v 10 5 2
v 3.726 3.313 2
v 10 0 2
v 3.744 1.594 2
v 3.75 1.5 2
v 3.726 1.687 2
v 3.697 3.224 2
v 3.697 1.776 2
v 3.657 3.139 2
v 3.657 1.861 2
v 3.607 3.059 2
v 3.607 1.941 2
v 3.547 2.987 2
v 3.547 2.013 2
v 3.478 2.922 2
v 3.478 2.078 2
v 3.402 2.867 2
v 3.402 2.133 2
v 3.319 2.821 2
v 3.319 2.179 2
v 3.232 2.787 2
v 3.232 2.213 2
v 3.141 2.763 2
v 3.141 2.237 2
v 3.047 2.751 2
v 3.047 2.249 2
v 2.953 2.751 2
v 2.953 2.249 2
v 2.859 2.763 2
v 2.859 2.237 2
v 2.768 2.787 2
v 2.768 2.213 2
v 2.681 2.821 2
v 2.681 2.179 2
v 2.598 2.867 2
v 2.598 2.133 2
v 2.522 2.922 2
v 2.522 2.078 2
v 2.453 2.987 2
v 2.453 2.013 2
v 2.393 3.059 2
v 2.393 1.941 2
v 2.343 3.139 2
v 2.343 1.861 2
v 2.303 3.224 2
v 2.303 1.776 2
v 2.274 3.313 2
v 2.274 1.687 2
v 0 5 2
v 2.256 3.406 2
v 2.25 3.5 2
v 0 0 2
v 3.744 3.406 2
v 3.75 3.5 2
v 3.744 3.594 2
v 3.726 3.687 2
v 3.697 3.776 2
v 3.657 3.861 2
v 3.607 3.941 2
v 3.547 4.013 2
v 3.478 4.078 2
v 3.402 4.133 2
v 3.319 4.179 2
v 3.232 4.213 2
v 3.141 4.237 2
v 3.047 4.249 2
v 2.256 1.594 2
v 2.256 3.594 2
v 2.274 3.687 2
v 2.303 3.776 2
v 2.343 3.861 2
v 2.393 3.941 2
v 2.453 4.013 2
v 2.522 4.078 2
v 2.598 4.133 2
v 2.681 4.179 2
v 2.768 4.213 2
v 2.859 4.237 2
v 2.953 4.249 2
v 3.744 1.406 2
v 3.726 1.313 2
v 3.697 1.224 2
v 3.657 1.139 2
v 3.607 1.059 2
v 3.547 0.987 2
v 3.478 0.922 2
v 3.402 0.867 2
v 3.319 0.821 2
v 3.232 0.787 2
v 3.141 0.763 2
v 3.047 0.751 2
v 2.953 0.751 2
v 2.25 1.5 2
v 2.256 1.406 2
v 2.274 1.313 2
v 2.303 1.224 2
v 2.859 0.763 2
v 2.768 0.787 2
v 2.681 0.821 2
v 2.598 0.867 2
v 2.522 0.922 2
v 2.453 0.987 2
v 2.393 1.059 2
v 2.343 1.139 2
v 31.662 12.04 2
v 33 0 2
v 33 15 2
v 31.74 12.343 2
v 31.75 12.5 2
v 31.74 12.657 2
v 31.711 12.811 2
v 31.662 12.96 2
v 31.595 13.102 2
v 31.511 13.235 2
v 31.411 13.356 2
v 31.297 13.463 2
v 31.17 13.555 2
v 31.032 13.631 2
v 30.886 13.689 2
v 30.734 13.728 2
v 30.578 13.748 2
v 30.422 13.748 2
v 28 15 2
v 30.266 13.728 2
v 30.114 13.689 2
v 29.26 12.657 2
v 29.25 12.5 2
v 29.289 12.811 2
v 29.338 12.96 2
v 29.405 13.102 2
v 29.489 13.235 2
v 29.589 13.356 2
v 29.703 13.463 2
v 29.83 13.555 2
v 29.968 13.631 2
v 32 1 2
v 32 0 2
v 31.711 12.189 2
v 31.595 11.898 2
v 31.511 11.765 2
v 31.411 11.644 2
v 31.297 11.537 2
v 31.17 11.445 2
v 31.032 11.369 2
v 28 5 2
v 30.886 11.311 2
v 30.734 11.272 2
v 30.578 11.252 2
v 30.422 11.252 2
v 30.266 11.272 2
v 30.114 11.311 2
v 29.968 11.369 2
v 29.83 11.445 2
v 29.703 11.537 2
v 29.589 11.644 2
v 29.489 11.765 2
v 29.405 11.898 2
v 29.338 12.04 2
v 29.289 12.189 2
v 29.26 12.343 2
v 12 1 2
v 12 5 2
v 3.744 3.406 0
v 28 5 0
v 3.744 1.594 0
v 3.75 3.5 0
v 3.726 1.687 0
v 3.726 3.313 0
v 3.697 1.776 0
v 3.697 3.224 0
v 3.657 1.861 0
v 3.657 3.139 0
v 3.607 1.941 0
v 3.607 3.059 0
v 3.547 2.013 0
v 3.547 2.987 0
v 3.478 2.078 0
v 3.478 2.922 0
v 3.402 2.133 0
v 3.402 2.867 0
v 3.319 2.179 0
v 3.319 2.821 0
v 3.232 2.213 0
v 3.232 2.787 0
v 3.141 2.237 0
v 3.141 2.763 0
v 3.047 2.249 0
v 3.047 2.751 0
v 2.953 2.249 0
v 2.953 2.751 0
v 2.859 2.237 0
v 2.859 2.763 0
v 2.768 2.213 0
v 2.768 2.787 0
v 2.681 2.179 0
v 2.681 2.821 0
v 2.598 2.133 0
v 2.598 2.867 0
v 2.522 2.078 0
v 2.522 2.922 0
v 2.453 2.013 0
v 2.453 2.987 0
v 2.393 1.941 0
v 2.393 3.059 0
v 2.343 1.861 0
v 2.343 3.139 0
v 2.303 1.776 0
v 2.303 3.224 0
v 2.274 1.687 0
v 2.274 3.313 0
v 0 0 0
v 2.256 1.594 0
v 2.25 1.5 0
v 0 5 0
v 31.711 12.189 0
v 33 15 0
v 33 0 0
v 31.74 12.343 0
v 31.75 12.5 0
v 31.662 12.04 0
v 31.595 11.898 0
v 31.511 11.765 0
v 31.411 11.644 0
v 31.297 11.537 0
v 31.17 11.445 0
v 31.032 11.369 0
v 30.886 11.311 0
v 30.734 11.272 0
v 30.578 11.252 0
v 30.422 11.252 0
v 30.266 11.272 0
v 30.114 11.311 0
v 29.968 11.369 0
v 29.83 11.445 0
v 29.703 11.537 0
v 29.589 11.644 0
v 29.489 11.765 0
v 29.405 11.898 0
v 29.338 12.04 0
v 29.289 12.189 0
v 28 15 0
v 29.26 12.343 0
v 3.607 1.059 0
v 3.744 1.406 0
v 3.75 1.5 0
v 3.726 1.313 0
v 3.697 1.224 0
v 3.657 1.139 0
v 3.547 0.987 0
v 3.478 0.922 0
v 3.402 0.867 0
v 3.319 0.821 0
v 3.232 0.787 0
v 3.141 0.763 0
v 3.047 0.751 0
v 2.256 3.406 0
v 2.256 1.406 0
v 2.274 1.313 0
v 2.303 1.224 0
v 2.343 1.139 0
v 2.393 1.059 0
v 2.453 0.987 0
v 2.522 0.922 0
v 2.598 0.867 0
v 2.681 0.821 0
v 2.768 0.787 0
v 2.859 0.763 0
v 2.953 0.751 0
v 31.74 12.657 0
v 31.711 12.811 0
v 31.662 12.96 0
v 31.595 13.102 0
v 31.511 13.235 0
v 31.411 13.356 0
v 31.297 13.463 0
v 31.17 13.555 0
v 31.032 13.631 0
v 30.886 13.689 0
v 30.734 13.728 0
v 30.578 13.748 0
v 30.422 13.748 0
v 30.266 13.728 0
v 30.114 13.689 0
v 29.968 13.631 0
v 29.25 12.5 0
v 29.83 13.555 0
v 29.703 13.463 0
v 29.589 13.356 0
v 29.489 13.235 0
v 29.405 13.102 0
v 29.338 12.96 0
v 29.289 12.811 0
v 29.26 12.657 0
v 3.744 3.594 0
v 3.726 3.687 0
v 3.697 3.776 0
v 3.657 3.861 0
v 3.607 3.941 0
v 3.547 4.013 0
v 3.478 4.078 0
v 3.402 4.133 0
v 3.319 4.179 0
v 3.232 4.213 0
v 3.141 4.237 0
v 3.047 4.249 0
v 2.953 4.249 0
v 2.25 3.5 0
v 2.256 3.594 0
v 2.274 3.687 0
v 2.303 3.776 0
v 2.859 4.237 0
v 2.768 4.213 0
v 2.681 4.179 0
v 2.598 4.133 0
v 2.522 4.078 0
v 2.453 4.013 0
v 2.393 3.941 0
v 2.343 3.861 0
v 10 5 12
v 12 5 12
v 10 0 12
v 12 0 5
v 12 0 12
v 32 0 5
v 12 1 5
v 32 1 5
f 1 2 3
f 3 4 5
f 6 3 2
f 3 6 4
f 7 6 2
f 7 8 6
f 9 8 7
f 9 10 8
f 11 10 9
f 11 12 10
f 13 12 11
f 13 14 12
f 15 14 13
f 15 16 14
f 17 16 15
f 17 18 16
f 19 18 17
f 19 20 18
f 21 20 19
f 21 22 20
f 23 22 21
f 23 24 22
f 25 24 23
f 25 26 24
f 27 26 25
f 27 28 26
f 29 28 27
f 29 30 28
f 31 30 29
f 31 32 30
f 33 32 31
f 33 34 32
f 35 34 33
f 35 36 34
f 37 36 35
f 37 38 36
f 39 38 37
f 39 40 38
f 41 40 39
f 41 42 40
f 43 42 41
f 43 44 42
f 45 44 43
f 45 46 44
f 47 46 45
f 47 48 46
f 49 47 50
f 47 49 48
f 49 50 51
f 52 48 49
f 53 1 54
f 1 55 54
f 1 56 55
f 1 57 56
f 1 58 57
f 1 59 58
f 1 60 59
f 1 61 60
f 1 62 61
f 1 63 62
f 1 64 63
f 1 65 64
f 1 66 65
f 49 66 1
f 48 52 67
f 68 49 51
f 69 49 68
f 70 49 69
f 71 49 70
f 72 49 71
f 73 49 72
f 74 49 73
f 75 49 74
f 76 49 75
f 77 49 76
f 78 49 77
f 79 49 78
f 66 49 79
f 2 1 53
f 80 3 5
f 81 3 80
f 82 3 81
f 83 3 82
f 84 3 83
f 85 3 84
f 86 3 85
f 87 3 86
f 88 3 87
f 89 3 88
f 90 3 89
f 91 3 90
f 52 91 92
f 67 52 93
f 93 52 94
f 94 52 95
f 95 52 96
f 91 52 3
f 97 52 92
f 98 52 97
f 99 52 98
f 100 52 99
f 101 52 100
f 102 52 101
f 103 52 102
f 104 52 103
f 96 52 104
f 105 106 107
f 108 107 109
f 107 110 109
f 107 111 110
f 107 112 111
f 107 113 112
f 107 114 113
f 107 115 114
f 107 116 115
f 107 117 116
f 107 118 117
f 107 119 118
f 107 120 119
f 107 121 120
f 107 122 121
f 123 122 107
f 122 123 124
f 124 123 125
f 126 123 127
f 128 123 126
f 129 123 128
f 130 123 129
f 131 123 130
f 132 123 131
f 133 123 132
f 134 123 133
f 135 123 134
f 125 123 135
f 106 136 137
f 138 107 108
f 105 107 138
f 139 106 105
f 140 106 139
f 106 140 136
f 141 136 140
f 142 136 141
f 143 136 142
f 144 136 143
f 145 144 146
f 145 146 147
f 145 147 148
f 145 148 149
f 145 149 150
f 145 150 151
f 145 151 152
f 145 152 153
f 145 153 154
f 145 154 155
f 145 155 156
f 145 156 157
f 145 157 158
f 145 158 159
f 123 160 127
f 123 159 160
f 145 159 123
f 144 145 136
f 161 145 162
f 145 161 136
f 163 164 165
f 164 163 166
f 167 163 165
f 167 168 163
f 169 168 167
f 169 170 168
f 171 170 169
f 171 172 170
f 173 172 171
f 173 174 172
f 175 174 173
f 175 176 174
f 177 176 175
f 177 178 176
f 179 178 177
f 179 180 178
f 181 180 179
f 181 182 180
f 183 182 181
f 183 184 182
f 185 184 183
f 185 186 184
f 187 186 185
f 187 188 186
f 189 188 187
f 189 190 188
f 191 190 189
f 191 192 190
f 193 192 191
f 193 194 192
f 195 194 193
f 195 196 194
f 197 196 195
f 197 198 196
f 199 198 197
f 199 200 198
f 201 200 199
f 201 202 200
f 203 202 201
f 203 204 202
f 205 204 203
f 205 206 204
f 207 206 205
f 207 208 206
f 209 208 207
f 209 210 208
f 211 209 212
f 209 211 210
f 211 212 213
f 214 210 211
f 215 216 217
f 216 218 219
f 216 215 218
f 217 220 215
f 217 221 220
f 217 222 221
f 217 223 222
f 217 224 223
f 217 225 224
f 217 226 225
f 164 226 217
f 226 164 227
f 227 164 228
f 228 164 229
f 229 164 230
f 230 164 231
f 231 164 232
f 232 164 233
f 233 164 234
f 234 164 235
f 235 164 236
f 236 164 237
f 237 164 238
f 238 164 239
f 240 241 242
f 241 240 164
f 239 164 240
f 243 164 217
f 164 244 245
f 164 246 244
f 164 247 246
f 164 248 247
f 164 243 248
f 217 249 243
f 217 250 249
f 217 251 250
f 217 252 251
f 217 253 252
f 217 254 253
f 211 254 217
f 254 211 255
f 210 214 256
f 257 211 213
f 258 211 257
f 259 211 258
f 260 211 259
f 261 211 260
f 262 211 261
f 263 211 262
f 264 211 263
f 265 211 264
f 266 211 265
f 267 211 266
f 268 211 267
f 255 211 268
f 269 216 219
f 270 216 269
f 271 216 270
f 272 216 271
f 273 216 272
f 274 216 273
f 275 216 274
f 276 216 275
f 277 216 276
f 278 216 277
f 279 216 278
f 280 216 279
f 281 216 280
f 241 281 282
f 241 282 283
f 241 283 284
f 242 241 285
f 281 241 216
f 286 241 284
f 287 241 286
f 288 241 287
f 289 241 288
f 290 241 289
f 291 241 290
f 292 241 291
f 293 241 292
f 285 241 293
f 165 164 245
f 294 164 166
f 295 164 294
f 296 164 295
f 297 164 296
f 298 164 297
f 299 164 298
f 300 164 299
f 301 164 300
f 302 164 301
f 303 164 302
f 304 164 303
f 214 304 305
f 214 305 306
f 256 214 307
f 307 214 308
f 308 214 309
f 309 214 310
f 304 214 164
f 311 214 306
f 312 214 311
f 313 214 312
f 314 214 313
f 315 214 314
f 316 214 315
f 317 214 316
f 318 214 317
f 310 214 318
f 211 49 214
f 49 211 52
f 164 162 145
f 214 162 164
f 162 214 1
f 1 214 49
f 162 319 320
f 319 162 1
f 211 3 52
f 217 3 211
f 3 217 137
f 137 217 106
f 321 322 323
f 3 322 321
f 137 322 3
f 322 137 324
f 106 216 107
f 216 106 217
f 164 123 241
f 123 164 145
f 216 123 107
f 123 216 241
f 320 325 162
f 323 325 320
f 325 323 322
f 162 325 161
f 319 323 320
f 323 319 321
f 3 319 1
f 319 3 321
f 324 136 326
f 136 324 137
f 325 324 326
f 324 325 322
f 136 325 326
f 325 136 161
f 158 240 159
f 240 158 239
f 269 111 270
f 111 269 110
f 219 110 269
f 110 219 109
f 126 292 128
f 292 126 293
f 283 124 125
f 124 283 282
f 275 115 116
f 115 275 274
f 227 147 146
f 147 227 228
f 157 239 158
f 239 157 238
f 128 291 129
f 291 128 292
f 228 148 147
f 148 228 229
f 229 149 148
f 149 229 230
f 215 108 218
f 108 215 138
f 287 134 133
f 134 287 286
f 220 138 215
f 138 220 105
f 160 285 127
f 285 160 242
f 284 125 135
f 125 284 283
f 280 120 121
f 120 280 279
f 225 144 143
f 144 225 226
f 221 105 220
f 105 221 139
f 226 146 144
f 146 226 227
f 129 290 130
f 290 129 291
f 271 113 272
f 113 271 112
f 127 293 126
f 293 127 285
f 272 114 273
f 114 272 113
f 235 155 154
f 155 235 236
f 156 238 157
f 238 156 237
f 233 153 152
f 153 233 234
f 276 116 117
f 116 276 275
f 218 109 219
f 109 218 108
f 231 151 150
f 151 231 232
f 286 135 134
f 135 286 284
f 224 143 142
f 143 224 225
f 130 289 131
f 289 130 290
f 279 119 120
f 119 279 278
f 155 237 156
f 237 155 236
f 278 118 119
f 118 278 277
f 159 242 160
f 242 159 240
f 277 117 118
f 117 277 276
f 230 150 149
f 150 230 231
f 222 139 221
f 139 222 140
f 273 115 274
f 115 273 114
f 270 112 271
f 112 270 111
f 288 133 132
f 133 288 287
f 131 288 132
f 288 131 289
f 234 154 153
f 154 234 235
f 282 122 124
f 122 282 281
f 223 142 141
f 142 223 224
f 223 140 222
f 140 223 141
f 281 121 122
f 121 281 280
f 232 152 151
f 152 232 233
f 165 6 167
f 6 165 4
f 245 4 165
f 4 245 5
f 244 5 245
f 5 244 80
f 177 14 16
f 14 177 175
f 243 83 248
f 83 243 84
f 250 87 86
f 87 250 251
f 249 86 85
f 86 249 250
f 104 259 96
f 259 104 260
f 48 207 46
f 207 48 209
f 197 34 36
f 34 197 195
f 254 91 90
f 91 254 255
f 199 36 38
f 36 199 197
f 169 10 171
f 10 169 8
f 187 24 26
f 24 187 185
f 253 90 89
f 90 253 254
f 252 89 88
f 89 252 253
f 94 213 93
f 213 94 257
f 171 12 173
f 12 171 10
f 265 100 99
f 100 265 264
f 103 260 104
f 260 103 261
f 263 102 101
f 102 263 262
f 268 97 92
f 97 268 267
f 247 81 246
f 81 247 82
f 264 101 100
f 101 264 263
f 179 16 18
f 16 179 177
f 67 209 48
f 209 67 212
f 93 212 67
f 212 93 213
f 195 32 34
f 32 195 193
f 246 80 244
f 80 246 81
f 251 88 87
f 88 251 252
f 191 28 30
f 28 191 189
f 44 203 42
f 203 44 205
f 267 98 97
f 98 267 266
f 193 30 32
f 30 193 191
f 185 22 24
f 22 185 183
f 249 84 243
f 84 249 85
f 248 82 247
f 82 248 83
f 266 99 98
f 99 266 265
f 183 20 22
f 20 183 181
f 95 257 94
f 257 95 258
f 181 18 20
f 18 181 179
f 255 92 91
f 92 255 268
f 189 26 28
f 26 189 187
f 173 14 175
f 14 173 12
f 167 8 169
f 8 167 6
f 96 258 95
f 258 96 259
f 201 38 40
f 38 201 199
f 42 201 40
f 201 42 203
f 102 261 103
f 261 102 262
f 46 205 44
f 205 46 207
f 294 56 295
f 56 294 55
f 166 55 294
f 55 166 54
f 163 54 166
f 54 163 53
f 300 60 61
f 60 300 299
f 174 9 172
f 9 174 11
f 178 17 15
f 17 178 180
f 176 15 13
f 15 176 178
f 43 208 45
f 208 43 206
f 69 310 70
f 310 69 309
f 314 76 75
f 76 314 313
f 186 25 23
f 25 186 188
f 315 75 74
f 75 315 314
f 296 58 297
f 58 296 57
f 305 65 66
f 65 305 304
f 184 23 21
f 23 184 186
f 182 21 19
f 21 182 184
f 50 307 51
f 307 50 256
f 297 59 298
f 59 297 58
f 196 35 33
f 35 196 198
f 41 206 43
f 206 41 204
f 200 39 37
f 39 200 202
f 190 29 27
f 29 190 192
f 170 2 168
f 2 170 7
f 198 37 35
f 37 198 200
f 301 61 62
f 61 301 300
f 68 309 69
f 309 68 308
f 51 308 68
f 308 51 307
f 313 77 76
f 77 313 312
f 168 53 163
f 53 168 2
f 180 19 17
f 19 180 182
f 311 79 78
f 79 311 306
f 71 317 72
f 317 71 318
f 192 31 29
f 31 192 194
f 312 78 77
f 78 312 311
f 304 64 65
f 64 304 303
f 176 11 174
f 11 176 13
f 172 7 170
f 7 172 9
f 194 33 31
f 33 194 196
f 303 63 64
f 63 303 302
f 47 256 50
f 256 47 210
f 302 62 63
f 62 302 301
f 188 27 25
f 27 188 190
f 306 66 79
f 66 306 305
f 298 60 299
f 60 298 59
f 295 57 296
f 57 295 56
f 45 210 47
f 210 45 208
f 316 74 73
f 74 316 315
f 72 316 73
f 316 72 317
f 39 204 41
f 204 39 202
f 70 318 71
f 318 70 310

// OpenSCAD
$fn=50;


module pi_holder(){

    difference(){
        union(){        
            cube([32,5,2]);
            
            
            translate([28,0,0])cube([5,15,2]);
            translate([10,0,2])cube([2,5,10]);
            translate([10,0,2])cube([22,1,3]);
            //translate([12,0,0])cube([2,5,10]);
        }
        union()
        {
           
            
            translate([32-1.5,12.5,1])cylinder(5,d=2.5,center=true);
            

            //translate([0,1.5,5])rotate([0,90,0])cylinder(5,d=1.5,center=true);
            translate([03,1.5,0])rotate([0,0,0])cylinder(5,d=1.5,center=true);
            //translate([0,1.4,9])rotate([0,90,0])cylinder(5,d=1.5,center=true);

            //translate([0,3.5,5])rotate([0,90,0])cylinder(5,d=1.5,center=true);
            translate([3,3.5,])rotate([0,0,0])cylinder(5,d=1.5,center=true);
            //translate([0,3.5,9])rotate([0,90,0])cylinder(5,d=1.5,center=true);


        }
    }
}    
pi_holder();
//translate([0,-2,0])mirror([0,1,0])sensor_holder();
